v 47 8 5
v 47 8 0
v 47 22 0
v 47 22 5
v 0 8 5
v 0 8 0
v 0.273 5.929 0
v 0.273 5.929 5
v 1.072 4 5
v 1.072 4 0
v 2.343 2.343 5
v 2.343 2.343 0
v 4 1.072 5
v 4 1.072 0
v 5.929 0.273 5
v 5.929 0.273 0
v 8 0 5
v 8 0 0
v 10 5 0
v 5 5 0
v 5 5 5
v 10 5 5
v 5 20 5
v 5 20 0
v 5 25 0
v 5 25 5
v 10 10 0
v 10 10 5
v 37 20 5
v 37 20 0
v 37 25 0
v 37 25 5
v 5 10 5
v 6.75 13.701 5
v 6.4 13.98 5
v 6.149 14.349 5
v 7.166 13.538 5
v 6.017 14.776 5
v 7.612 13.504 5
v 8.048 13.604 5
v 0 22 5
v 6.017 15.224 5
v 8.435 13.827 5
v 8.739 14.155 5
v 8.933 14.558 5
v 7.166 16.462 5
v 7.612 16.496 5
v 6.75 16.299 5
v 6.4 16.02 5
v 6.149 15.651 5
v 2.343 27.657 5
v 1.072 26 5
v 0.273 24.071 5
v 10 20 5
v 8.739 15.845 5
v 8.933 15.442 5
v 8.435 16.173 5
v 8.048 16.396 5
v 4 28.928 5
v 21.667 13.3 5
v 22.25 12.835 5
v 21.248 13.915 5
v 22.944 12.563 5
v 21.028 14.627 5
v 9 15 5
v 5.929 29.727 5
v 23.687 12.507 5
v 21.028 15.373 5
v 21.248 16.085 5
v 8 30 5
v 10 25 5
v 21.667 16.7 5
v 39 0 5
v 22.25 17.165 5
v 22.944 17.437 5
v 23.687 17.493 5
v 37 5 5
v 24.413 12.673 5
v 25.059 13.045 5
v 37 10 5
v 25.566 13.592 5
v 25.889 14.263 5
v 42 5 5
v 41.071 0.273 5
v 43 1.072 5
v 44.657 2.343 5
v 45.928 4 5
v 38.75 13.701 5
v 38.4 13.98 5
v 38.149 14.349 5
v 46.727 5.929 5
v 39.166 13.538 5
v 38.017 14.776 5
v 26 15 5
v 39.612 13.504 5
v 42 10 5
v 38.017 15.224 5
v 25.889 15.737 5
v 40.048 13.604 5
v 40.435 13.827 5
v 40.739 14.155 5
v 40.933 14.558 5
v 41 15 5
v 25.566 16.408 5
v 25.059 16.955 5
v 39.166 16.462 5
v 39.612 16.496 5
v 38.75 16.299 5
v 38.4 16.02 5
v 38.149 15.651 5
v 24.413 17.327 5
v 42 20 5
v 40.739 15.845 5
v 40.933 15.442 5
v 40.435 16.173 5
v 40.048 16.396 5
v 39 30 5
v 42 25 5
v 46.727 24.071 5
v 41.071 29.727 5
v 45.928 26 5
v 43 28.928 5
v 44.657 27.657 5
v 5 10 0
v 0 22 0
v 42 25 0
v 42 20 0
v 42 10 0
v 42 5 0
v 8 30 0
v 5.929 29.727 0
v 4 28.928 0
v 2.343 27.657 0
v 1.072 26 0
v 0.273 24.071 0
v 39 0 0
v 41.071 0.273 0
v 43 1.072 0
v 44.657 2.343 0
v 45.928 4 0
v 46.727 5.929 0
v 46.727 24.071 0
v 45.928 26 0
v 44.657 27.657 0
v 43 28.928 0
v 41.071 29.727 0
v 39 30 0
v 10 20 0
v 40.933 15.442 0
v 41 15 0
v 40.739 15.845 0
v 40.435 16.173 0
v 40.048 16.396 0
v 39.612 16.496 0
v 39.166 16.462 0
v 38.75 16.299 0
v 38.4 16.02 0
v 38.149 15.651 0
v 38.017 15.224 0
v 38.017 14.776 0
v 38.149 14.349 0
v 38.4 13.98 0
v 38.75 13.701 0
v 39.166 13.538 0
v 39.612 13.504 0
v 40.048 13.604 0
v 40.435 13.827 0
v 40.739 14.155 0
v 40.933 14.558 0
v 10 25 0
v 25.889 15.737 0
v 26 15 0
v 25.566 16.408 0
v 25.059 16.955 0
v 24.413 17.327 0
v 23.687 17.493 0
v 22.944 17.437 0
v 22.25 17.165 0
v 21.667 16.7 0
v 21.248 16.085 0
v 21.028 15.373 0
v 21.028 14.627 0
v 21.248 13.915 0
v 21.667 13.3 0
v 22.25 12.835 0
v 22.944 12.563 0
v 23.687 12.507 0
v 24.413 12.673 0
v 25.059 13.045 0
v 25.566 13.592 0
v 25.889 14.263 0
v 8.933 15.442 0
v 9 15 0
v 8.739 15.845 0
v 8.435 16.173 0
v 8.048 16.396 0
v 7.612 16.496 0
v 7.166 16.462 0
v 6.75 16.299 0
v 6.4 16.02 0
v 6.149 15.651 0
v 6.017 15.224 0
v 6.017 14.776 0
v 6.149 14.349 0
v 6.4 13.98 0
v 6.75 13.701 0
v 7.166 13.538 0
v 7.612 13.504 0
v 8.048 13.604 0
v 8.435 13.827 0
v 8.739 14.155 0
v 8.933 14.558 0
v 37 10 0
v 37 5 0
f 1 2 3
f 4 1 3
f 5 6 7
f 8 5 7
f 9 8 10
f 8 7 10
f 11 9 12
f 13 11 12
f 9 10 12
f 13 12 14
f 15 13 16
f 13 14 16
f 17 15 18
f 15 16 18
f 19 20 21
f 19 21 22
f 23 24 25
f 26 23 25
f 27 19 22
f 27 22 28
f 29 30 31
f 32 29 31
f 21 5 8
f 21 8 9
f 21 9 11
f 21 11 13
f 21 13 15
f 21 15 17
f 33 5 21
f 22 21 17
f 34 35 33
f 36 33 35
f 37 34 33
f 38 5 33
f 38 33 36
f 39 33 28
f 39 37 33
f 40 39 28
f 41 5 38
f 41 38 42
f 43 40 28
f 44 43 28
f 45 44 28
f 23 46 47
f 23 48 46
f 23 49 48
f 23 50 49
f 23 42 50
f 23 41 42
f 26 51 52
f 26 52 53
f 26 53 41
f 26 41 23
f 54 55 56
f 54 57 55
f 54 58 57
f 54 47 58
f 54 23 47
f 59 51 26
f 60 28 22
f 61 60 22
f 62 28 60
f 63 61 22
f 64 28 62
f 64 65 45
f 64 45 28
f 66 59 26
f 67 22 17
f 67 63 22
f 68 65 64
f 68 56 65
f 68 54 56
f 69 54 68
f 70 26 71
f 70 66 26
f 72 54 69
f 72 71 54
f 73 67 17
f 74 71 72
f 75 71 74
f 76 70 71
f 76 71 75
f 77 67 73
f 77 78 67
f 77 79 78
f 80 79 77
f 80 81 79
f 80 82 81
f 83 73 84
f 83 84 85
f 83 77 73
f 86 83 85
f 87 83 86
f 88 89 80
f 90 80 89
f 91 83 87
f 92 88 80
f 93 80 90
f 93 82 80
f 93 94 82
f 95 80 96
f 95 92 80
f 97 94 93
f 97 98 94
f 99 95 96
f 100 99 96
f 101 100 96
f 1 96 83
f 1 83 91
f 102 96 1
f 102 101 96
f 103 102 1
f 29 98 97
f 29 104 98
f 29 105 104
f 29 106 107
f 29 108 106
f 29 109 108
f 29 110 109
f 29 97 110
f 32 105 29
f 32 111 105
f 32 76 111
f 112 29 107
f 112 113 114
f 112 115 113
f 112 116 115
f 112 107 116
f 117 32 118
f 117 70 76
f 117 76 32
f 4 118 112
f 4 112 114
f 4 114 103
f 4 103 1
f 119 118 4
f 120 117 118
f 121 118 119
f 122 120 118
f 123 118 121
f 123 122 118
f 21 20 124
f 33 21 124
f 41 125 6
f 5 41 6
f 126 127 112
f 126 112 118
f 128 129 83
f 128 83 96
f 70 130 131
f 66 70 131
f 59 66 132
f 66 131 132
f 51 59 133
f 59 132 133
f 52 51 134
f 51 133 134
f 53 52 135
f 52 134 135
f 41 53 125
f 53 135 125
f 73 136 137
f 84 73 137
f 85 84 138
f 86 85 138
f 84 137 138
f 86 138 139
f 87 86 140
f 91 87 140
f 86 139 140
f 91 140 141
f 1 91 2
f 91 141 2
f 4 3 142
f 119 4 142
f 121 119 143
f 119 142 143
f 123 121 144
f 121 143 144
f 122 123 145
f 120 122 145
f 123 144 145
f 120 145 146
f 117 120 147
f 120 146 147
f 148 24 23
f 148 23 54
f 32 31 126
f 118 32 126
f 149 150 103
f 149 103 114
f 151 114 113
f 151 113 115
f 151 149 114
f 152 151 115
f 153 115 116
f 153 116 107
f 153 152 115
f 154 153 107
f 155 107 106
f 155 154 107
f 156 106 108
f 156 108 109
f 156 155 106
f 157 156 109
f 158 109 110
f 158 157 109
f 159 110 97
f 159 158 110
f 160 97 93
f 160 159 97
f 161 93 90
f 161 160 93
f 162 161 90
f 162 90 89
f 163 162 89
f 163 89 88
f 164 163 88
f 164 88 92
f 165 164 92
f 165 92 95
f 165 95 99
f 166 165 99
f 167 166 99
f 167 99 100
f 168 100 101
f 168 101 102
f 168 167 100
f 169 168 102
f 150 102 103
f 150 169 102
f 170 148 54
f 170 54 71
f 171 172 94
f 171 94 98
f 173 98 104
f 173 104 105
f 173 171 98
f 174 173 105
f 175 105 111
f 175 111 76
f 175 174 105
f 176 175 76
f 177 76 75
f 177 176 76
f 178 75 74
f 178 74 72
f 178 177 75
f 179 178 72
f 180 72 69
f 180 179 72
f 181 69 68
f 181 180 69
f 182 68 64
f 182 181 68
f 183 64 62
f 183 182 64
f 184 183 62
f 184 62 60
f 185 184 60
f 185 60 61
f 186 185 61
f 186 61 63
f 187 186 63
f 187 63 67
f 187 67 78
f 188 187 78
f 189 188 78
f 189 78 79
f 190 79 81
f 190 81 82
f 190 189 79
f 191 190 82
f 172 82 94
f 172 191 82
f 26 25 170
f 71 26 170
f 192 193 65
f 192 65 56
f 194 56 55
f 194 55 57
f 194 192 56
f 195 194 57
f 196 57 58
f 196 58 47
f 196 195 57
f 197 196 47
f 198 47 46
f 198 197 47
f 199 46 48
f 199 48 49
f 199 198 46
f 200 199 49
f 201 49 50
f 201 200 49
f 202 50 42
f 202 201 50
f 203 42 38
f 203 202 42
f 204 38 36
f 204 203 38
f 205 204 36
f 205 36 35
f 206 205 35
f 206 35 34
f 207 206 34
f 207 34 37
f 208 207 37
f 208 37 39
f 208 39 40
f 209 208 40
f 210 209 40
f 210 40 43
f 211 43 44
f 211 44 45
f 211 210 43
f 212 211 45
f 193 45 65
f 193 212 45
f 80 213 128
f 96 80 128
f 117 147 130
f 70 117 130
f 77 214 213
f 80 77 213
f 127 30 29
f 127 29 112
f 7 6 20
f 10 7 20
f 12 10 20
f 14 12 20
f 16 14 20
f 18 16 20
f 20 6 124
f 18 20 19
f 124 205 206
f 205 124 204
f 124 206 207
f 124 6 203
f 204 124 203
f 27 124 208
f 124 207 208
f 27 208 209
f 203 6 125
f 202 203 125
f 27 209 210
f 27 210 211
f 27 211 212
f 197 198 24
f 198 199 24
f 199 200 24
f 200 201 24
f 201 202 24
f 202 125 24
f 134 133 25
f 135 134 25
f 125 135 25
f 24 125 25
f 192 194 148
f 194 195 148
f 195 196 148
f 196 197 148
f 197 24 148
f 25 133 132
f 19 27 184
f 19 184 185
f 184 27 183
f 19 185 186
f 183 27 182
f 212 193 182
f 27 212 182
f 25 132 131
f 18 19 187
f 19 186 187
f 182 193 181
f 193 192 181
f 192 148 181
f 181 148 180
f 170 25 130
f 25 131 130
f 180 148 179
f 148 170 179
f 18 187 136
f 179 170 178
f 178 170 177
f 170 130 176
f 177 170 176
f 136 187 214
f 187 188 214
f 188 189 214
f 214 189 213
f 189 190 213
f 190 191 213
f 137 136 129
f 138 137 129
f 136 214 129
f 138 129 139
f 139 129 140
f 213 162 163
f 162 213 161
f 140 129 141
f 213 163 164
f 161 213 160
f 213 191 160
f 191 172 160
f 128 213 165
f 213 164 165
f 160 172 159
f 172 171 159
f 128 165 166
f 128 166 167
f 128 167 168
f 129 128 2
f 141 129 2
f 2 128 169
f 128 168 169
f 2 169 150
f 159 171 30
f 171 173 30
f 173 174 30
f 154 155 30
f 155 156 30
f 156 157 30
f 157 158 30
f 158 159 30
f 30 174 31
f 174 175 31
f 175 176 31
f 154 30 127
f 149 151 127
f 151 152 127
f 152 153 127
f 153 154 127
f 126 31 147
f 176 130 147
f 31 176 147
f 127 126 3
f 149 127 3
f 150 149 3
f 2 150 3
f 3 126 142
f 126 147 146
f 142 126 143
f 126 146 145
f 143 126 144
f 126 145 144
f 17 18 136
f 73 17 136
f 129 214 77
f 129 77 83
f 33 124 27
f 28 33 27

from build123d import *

# Parameters (mm, degrees)
ESQUISSE1_R        = 1.5
ESQUISSE1_R_2      = 2.5
ESQUISSE1_W        = 5
ESQUISSE1_H        = 5
BOSS_EXTRU_1_DEPTH = 5


with BuildPart() as part:
    # Esquisse1 → Boss.-Extru.1 (new body)
    with BuildSketch(Plane.XY):
        with BuildLine():
            Line((8, 0), (39, 0))
            ThreePointArc((39, 0), (44.656854249, 2.343145751), (47, 8))
            Line((47, 8), (47, 22))
            ThreePointArc((47, 22), (44.656854249, 27.656854249), (39, 30))
            Line((39, 30), (8, 30))
            ThreePointArc((8, 30), (2.343145751, 27.656854249), (0, 22))
            Line((0, 22), (0, 8))
            ThreePointArc((0, 8), (2.343145751, 2.343145751), (8, 0))
        make_face()
        with Locations((7.5, 15)):
            Circle(ESQUISSE1_R, mode=Mode.SUBTRACT)
        with Locations((39.5, 15)):
            Circle(ESQUISSE1_R, mode=Mode.SUBTRACT)
        with Locations((23.5, 15)):
            Circle(ESQUISSE1_R_2, mode=Mode.SUBTRACT)
        with Locations((7.5, 22.5)):
            Rectangle(ESQUISSE1_W, ESQUISSE1_H, mode=Mode.SUBTRACT)
        with Locations((39.5, 22.5)):
            Rectangle(ESQUISSE1_W, ESQUISSE1_H, mode=Mode.SUBTRACT)
        with Locations((39.5, 7.5)):
            Rectangle(ESQUISSE1_W, ESQUISSE1_H, mode=Mode.SUBTRACT)
        with Locations((7.5, 7.5)):
            Rectangle(ESQUISSE1_W, ESQUISSE1_H, mode=Mode.SUBTRACT)
    extrude(amount=BOSS_EXTRU_1_DEPTH)


solid = part.part
